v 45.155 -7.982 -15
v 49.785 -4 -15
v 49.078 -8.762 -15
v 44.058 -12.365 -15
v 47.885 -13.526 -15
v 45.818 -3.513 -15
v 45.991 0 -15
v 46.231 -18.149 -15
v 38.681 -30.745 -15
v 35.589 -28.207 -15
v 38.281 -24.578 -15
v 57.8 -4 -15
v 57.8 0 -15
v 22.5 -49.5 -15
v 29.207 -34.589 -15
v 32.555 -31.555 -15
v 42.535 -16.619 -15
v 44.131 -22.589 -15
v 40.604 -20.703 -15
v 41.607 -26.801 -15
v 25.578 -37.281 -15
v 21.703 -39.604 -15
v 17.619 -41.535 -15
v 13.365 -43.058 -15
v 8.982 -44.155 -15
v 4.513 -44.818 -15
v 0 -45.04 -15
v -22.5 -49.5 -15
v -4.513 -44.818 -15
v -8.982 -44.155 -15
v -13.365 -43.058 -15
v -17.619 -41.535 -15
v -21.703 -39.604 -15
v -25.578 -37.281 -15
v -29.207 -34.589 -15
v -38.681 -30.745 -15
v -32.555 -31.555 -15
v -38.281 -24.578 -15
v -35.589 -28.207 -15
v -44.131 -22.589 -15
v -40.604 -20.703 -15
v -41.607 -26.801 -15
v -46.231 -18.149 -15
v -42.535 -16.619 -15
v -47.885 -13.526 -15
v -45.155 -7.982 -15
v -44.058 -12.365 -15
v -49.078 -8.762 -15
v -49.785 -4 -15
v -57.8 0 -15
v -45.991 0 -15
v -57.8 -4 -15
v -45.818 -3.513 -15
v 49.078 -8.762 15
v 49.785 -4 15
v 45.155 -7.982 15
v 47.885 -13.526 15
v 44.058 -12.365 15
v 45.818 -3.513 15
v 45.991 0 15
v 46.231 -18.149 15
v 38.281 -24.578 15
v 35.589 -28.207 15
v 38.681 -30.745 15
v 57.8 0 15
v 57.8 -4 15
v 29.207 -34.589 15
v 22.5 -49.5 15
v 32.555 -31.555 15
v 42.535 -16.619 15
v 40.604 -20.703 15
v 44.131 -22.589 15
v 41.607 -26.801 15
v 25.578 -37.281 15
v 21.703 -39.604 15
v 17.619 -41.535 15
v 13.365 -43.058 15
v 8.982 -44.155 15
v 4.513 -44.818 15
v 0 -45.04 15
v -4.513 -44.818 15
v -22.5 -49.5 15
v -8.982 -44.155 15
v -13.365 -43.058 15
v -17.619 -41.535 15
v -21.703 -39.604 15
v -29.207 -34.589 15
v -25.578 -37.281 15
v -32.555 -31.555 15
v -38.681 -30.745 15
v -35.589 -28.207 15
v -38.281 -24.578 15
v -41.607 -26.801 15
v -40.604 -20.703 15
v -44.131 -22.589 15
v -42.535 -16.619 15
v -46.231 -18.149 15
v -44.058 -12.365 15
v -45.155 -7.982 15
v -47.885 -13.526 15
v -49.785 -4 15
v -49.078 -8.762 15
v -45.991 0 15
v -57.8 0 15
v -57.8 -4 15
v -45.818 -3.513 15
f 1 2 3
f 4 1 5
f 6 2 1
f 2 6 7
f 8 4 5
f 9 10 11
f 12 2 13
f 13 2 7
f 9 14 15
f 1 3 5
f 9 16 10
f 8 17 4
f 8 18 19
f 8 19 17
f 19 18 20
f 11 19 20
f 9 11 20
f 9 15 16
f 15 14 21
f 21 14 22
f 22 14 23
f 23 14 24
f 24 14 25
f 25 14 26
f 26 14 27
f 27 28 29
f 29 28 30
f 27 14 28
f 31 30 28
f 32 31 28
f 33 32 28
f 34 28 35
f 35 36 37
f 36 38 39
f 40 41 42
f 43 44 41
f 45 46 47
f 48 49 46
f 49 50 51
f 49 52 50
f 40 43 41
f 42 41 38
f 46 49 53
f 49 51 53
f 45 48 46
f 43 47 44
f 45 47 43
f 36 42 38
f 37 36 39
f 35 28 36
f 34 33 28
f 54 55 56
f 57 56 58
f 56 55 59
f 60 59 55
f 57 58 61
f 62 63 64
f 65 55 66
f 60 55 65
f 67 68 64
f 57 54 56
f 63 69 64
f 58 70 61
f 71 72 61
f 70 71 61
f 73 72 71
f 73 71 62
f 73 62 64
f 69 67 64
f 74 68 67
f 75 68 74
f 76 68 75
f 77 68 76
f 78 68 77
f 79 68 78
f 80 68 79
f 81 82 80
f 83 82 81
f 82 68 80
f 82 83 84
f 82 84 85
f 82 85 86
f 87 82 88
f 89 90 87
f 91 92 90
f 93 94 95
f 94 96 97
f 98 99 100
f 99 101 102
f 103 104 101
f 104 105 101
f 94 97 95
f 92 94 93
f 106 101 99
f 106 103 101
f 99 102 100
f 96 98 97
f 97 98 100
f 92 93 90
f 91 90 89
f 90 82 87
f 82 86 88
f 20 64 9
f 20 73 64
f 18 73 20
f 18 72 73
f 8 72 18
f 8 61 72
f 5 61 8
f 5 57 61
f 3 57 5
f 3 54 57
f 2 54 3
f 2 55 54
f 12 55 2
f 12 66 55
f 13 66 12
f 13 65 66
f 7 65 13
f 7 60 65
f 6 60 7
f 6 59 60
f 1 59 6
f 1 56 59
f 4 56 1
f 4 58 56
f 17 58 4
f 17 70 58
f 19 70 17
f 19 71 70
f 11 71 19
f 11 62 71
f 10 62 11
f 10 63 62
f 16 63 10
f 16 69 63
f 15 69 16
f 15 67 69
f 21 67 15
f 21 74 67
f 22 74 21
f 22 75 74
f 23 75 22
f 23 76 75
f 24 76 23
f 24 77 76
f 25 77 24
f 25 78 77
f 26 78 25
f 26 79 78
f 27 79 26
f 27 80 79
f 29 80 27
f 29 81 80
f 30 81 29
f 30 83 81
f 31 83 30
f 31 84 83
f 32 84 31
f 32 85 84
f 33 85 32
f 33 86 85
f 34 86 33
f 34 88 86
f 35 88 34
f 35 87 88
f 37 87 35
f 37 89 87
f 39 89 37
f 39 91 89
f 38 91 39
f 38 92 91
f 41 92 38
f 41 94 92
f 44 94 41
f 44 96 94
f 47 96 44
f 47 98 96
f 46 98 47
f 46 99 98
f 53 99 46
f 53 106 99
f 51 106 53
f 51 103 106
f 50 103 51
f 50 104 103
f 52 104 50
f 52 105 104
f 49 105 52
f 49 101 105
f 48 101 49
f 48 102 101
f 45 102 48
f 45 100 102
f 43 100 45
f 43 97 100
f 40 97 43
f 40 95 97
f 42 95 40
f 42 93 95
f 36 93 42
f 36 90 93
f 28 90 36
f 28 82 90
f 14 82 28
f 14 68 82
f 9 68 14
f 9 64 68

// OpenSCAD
// file: clamp.scad
// Flange Clamp for the Blue Robotics Watertight Enclosure
//
// This document is a parametric design that does not include dimensions.
// Please use one of the accompanying files, e.g., enclosure-clamp-3in.scad.
//
// Based on the WTE3-M-CLAMP-R1 model by Blue Robotics:
// https://bluerobotics.com/store/watertight-enclosures/enclosure-clamp/
//
// OpenSCAD model by Ryan Govostes.
// License: CC BY 4.0 (https://creativecommons.org/licenses/by/4.0/)


fillet_radius = 1.00;


$fn = 64;


translate([0, 0, -(height/2)])
linear_extrude(height) {
    difference() {
        union() {
            hull() {
                translate([0, circle_y_offset])
                circle(r=(radius + thickness));

                translate([-(base_width/2), -depth])
                square(size=[base_width, 1]);
            }

            translate([-(width/2), -thickness])
            square([width, thickness]);
        }

        translate([0, circle_y_offset])
        circle(r=radius);

        // Cut off the top half of the shape
        translate([-200, 0])
        square([400, 400]);
    }
}

// TODO: Flange fillets
// TODO: Mounting and flange holes
// main file
// Flange Clamp for the Blue Robotics Watertight Enclosure, 3" (75mm) series
//
// Based on the WTE3-M-CLAMP-R1 model by Blue Robotics:
// https://bluerobotics.com/store/watertight-enclosures/enclosure-clamp/
//
// OpenSCAD model by Ryan Govostes.
// License: CC BY 4.0 (https://creativecommons.org/licenses/by/4.0/)


radius = 46.04;  // Tube OD - aluminum: 86.5 +/- 0.3mm, acrylic: 88.9 +/- 0.7mm
thickness = 4.00;

width = 115.60;
depth = 49.50;
height = 30.00;

base_width = 45.00;
base_hole_diameter = 3.30;  // M4x14
base_hole_depth = 5.50;

flange_hole_diameter = 2.50;  // M3x12


// The circle is centered 1.00 mm above the X axis. This detail is not
// captured in the mechanical drawing but has been confirmed by Blue Robotics:
//
// https://discuss.bluerobotics.com/t/small-offset-in-mounting-clamp/15944/2
circle_y_offset = 1.00;


include <clamp.scad>;
